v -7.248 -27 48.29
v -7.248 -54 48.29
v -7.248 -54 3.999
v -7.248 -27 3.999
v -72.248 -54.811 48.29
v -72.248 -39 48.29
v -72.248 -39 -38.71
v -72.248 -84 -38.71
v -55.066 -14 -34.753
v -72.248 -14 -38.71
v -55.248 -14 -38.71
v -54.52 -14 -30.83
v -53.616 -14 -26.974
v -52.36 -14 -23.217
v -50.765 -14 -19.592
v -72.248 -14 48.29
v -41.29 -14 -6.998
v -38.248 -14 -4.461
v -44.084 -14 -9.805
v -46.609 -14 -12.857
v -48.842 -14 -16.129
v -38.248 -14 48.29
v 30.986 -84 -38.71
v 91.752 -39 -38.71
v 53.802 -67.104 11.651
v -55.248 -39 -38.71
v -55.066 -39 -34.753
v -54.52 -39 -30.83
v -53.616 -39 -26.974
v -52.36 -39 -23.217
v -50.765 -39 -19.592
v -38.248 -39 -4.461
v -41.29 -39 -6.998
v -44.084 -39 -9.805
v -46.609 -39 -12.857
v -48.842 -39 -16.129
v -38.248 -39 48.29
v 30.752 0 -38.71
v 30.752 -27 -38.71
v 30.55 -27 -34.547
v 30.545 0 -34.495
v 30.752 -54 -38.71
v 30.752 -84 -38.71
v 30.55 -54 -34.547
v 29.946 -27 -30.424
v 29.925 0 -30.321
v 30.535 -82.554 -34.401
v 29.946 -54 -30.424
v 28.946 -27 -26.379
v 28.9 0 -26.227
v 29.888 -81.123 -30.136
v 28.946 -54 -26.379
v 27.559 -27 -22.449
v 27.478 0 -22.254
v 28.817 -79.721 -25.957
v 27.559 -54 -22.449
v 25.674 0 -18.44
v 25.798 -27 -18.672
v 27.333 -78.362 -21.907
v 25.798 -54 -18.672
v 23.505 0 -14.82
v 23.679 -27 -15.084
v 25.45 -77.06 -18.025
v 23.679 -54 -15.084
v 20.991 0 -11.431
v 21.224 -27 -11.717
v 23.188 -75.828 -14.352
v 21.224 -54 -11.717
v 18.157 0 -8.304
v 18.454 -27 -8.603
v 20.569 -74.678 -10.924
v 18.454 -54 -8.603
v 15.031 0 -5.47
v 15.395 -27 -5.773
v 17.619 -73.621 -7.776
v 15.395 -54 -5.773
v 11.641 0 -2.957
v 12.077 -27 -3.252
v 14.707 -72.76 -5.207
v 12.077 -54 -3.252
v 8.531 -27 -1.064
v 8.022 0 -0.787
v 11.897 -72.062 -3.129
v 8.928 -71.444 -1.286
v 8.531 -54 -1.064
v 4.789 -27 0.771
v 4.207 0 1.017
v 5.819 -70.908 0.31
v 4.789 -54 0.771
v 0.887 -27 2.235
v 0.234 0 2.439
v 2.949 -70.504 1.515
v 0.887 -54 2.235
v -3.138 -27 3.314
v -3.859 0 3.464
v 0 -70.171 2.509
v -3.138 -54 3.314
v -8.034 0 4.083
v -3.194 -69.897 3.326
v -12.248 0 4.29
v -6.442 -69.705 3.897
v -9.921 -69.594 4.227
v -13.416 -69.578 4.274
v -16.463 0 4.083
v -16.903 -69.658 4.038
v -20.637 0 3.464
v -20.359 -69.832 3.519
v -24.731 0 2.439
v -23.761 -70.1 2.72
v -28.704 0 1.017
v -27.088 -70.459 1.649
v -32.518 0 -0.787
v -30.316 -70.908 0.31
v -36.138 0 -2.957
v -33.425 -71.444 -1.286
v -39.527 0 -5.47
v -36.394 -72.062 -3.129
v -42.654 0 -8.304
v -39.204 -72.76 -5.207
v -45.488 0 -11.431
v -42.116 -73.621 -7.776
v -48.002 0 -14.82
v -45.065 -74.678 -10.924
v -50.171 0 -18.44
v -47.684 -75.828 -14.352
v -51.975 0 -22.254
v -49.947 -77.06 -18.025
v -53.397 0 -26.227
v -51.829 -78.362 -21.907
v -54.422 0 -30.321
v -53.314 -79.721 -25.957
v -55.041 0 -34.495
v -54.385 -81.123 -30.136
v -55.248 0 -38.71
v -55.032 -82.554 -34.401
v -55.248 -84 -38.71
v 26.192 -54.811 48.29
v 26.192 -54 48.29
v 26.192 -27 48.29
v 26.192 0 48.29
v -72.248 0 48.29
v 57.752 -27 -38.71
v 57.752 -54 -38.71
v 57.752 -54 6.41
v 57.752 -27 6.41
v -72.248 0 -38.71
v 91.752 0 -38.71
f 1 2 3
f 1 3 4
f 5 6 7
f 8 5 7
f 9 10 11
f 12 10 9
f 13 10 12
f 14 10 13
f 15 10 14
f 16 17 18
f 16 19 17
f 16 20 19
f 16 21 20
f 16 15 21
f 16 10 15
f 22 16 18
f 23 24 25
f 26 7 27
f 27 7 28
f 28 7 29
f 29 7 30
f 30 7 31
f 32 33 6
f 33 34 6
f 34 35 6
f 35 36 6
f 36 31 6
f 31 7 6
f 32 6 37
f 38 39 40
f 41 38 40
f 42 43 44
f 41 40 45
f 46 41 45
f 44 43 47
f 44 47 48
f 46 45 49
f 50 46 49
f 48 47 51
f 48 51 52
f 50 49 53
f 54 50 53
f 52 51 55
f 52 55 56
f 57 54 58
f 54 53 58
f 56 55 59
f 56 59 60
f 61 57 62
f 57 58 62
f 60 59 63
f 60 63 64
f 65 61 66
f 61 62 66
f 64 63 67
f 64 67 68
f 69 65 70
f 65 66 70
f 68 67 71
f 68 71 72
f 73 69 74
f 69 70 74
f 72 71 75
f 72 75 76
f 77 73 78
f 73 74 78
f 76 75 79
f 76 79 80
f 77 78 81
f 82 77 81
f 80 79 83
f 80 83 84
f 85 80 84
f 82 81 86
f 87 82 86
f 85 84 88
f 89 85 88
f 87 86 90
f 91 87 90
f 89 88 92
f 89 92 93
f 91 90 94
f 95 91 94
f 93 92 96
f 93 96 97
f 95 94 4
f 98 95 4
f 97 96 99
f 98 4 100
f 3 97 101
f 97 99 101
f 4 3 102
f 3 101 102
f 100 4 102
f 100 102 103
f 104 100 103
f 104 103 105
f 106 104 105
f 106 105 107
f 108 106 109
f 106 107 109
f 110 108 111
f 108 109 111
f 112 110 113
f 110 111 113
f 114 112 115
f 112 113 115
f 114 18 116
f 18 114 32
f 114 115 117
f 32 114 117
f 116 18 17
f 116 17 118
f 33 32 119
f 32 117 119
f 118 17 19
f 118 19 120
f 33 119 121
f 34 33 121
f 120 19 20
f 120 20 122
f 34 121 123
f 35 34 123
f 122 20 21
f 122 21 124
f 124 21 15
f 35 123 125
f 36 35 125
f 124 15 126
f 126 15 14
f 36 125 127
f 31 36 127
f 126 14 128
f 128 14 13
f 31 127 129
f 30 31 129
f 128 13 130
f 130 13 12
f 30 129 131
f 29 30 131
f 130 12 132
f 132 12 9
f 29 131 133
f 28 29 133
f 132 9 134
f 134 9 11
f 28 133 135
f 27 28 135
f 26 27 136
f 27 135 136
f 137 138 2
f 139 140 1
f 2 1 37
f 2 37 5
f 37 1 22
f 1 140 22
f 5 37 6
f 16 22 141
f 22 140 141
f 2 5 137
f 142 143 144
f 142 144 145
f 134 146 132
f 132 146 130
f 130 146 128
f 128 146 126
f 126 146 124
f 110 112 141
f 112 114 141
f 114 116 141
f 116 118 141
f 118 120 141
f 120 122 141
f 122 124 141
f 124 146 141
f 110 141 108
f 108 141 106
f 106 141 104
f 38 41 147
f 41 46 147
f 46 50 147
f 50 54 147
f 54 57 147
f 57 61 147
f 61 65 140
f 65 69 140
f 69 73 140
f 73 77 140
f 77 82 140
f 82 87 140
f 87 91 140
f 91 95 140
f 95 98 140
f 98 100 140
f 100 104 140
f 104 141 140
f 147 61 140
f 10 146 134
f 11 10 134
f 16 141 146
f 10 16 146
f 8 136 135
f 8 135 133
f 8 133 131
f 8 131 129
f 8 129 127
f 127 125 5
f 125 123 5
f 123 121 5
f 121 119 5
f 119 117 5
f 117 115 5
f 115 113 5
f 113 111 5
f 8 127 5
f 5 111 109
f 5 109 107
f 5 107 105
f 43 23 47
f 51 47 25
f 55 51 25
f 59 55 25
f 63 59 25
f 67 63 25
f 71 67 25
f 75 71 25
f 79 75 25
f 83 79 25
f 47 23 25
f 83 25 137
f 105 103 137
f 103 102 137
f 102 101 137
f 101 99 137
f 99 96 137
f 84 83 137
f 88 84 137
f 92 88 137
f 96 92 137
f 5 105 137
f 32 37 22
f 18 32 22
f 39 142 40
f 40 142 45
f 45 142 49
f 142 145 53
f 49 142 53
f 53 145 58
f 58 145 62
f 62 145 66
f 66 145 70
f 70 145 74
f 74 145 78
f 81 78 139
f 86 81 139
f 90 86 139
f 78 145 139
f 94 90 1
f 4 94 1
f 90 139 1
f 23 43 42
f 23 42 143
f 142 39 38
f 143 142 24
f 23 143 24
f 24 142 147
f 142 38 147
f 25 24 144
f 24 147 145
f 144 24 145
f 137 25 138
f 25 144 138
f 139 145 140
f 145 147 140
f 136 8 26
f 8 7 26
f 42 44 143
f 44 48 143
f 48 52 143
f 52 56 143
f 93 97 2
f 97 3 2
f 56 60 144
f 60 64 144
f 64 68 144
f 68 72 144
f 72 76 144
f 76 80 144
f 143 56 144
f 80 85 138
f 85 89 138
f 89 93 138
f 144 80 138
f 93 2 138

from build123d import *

# Parameters (mm, degrees)
F1_DEPTH       = 84
F3_W           = 33.4407976411
F3_H           = 27
F3_W_2         = 31.5592023589
F4_DEPTH       = 184
F5_W           = 34
F5_H           = 25
F6_DEPTH       = 363
F8_DEPTH       = 191
F13_DEPTH      = 133.5
F13_DEPTH_BACK = 142.2
F15_DEPTH      = 289
F15_DEPTH_BACK = 99


with BuildPart() as f1:
    # F0 (on Front) → F1 (new body)
    with BuildSketch(Plane.XZ):
        Polygon((26.1924322695, 48.2902998924), (-72.2483653716, 48.2902998924), (-72.2483653716, -38.7097001076), (91.7516346284, -38.7097001076), align=None)
    extrude(amount=F1_DEPTH)

    # F3 (on offset) → F4 (cut)
    with BuildSketch(Plane.XY.offset(73.2902998924)):
        with Locations((9.4720334489, -40.5)):
            Rectangle(F3_W, F3_H)
        with Locations((41.9720334489, -40.5)):
            Rectangle(F3_W_2, F3_H)
    extrude(amount=-F4_DEPTH, mode=Mode.SUBTRACT)

    # F5 (on face) → F6 (cut)
    with BuildSketch(Plane.XY.offset(48.2902998924)):
        with Locations((-55.2483653716, -26.5)):
            Rectangle(F5_W, F5_H)
    extrude(amount=-F6_DEPTH, mode=Mode.SUBTRACT)

    # F7 (on face) → F8 (cut)
    with BuildSketch(Plane.XZ.offset(84)):
        with BuildLine():
            ThreePointArc((-55.2483653716, -38.7097001076), (-12.2483653716, -81.7097001076), (30.7516346284, -38.7097001076))
            ThreePointArc((30.7516346284, -38.7097001076), (-12.2483653716, 4.2902998924), (-55.2483653716, -38.7097001076))
        make_face()
    extrude(amount=-F8_DEPTH, mode=Mode.SUBTRACT)

    # F12 (on Right) → F13 (cut, two sides)
    with BuildSketch(Plane.YZ) as f13_sk:
        Polygon((-84, 4.2902998924), (-84, -38.7097001076), (-54.8107397577, 48.2902998924), (-84, 48.2902998924), align=None)
    extrude(amount=-F13_DEPTH, mode=Mode.SUBTRACT)
    extrude(f13_sk.sketch, amount=F13_DEPTH_BACK, mode=Mode.SUBTRACT)

    # F14 (on Top) → F15 (cut, two sides)
    with BuildSketch(Plane.XY) as f15_sk:
        Polygon((91.7516346284, -84), (91.7516346284, -64), (91.7516346284, -39), (30.9858489782, -84), align=None)
    extrude(amount=F15_DEPTH, mode=Mode.SUBTRACT)
    extrude(f15_sk.sketch, amount=-F15_DEPTH_BACK, mode=Mode.SUBTRACT)


solid = f1.part
